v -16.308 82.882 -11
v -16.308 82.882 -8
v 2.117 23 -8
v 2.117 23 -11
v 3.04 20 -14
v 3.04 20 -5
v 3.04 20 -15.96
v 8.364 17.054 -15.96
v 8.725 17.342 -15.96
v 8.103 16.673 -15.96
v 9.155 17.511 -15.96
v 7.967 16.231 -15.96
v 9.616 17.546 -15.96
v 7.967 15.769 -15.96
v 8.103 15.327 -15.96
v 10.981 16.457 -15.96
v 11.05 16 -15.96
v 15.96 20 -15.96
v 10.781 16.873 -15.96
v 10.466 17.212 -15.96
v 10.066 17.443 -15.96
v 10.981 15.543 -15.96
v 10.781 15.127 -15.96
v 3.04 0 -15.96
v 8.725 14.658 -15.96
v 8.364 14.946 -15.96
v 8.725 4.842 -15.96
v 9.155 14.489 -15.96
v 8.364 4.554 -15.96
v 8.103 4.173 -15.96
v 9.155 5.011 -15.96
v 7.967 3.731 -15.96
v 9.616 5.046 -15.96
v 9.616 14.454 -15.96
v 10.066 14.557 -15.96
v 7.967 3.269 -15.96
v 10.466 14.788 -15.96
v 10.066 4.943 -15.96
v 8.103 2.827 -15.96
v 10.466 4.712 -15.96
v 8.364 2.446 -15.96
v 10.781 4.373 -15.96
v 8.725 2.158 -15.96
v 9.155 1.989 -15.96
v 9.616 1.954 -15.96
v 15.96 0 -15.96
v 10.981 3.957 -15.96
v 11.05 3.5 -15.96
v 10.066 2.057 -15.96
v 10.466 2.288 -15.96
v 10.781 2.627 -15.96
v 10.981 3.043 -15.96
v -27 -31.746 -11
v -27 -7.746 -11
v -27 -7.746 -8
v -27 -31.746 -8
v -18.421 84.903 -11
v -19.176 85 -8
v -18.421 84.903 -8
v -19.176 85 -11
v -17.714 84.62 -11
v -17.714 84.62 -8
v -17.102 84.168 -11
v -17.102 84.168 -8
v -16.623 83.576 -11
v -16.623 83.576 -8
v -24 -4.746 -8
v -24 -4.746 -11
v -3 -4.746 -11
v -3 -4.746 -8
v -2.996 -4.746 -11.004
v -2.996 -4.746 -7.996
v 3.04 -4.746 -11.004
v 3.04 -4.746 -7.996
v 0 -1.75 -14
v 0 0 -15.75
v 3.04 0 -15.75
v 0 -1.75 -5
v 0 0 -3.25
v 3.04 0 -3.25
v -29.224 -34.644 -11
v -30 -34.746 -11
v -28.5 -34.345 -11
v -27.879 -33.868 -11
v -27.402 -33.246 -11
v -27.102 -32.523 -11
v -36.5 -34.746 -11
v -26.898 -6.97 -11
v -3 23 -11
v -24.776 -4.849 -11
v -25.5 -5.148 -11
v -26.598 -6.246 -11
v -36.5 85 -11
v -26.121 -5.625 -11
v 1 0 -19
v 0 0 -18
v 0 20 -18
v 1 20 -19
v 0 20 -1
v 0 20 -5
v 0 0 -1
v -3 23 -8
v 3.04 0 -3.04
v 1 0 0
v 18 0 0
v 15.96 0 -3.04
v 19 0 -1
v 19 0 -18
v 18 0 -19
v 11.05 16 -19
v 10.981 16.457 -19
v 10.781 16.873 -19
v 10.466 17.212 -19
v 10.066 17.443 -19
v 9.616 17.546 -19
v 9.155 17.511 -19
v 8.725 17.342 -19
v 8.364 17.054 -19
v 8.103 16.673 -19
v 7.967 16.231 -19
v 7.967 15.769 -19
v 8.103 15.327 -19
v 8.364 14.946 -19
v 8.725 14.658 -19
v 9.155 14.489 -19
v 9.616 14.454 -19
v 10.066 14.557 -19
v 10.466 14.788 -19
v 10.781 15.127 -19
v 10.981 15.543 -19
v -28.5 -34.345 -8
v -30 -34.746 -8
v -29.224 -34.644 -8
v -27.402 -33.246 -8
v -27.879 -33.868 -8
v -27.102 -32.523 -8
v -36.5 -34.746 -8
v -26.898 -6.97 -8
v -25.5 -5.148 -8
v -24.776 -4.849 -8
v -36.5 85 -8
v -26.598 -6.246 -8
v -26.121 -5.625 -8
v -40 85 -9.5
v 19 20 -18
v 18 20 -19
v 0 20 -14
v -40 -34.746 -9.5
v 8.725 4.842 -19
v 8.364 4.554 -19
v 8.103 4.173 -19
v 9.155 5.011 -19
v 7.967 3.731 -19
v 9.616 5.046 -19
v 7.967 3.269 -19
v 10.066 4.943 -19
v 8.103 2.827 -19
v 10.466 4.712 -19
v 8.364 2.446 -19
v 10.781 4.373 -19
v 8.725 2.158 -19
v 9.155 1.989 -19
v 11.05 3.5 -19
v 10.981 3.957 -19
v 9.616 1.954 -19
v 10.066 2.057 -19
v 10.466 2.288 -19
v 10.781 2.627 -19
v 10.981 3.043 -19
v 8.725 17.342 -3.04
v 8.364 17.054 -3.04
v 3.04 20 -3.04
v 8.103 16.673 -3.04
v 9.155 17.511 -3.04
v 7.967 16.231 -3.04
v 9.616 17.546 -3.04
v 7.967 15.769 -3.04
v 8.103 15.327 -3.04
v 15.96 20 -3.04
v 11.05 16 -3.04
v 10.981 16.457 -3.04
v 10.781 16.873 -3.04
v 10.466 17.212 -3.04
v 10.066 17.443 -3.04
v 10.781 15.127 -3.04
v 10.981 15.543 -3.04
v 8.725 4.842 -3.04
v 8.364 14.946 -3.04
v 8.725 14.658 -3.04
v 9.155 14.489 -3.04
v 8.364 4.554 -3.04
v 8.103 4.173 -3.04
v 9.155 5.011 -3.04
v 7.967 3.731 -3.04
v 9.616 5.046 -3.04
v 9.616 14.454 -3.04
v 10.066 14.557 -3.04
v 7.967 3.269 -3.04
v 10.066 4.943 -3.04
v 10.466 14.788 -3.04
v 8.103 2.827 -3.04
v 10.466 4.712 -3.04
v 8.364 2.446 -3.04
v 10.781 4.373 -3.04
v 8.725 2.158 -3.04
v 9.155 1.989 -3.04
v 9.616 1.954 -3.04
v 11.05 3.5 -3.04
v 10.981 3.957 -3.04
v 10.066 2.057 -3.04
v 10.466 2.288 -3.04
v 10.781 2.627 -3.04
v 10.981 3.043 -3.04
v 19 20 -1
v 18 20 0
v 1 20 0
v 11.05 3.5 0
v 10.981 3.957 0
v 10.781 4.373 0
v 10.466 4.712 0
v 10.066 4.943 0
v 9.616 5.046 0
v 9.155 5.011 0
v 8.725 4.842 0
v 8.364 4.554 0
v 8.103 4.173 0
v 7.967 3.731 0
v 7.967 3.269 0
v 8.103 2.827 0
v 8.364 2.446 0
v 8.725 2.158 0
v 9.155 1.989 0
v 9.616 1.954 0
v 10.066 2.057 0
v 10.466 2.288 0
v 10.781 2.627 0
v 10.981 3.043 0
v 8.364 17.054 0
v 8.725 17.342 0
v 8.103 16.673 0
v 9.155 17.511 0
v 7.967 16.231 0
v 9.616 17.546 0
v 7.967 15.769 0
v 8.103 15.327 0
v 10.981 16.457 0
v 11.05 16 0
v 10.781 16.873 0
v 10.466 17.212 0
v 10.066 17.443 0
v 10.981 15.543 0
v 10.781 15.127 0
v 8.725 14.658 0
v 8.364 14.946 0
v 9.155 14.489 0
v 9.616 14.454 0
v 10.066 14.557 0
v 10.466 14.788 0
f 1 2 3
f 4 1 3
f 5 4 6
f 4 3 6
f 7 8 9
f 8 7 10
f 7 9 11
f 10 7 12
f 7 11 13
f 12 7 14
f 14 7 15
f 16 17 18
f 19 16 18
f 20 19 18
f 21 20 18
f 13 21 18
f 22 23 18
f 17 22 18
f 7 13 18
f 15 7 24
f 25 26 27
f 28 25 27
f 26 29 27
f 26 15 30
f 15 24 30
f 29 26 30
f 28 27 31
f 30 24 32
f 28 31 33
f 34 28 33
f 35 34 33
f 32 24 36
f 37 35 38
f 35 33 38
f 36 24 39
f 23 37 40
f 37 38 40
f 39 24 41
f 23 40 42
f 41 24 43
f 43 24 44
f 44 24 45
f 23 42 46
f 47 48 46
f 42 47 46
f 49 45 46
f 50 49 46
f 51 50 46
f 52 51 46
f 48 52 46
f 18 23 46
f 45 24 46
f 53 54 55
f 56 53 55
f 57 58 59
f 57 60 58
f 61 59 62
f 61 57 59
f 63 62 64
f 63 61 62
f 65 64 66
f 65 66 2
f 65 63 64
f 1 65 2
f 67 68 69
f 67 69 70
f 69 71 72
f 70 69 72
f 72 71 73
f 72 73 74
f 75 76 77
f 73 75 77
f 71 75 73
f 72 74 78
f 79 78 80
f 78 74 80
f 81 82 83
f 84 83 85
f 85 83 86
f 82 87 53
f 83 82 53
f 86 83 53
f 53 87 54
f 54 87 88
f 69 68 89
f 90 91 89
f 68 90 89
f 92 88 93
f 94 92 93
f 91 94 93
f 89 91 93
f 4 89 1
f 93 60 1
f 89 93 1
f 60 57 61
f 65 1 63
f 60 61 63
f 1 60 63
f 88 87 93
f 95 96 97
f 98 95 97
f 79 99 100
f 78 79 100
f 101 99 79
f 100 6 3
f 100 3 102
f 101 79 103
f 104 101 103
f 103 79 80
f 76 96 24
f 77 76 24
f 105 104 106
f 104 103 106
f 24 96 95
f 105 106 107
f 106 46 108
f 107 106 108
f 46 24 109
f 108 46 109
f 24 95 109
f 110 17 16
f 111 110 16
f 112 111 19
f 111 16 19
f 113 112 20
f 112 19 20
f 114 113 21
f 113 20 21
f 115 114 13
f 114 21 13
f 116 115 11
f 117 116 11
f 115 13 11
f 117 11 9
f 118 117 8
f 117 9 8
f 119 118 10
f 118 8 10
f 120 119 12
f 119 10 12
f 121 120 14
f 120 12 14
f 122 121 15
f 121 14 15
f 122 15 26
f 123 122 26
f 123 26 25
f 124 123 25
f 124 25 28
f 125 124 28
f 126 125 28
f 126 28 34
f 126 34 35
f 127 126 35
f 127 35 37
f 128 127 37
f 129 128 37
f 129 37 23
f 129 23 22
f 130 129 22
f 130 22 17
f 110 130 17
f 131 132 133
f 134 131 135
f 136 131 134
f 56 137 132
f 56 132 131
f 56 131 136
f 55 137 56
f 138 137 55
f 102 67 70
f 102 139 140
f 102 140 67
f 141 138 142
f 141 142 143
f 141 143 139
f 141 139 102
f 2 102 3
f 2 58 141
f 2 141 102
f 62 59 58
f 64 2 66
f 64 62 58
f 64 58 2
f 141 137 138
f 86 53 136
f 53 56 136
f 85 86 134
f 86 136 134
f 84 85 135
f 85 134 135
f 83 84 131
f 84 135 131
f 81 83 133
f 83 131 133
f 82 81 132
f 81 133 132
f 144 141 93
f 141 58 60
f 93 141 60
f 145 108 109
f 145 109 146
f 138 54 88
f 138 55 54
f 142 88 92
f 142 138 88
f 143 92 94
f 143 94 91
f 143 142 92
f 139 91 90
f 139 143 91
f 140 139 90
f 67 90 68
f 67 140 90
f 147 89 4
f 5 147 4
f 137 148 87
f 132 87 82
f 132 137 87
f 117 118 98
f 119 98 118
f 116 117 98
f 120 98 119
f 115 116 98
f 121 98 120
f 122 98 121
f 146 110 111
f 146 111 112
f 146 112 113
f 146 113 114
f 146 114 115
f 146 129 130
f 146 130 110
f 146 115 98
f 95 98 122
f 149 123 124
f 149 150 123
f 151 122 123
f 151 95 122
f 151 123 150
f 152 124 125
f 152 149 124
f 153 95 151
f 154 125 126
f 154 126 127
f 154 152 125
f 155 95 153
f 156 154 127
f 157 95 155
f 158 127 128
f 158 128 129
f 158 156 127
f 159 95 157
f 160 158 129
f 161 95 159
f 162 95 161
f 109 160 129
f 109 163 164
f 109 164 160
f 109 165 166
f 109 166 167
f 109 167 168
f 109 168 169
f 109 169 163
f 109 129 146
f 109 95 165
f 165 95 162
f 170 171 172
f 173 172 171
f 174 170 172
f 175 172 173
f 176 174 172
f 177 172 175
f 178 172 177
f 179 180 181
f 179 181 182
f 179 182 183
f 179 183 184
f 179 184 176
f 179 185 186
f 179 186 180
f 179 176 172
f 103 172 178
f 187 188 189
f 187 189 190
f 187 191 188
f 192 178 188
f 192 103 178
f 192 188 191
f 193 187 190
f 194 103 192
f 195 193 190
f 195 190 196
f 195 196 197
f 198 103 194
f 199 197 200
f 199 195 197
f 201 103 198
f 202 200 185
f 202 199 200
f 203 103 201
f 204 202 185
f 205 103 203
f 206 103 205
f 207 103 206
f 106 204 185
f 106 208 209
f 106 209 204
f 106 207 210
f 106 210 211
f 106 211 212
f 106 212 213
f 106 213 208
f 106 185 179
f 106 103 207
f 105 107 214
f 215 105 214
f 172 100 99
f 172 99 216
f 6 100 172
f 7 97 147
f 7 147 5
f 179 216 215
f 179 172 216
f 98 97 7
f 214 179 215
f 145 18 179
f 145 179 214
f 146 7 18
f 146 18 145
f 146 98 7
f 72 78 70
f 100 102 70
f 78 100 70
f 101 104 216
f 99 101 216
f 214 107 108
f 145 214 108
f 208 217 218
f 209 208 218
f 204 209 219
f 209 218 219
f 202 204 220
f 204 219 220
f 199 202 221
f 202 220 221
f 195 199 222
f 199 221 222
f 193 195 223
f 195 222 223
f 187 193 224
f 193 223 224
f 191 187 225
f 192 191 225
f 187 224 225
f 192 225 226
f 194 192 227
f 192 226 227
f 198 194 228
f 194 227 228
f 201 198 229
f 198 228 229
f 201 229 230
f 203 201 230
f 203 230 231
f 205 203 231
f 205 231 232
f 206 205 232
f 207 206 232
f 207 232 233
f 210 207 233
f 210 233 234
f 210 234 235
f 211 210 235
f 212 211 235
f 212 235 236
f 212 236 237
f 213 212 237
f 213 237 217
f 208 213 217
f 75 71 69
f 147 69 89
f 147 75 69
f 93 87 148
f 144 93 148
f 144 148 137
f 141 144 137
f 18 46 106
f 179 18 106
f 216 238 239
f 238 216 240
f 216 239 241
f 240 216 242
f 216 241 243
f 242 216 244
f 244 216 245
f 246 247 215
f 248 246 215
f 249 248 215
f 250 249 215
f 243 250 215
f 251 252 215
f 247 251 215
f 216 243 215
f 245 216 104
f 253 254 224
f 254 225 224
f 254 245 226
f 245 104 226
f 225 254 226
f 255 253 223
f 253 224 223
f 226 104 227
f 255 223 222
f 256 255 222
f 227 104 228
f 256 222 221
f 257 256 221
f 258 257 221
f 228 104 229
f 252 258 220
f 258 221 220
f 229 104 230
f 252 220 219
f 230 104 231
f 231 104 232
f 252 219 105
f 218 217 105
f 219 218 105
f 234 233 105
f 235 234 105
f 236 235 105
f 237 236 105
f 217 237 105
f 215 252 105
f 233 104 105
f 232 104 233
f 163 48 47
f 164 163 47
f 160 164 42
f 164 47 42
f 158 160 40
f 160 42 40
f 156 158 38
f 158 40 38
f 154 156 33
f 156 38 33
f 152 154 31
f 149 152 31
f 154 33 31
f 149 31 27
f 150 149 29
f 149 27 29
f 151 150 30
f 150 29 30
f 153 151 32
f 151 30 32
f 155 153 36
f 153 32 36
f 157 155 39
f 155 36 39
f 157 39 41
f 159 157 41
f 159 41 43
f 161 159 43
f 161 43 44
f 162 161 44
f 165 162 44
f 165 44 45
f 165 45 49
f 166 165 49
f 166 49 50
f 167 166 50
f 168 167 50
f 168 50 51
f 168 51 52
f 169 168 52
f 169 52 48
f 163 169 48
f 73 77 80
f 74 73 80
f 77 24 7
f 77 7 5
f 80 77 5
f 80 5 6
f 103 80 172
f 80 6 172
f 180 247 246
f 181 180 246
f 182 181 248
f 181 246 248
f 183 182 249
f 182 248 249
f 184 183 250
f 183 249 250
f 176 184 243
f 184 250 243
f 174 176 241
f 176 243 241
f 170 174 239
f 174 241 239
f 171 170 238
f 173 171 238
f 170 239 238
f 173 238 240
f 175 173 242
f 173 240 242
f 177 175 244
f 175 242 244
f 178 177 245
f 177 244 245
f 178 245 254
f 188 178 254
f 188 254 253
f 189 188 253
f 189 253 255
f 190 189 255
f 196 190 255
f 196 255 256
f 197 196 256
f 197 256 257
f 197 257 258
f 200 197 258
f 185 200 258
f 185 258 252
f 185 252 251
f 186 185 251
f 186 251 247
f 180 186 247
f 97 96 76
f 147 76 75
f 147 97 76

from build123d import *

# Parameters (mm, degrees)
SKETCH1_W                = 19
SKETCH1_H                = 19
SKETCH1_W_2              = 12.12
SKETCH1_H_2              = 12.12
BOSS_EXTRUDE1_DEPTH      = 20
SKETCH2_R                = 1.55
CUT_EXTRUDE1_DEPTH       = 22
SKETCH3_W                = 12.92
SKETCH3_H                = 12.92
CUT_EXTRUDE2_DEPTH       = 20
BOSS_EXTRUDE2_DEPTH      = 40
BOSS_EXTRUDE2_DEPTH_BACK = 3.04
CUT_EXTRUDE3_DEPTH       = 40
SKETCH7_W                = 13
SKETCH7_H                = 3
BOSS_EXTRUDE3_DEPTH      = 30
CUT_EXTRUDE4_DEPTH       = 129
FILLET2_R                = 3
FILLET3_R                = 3
FILLET4_R                = 3
FILLET5_SIZE             = 4.75
FILLET6_SIZE             = 3
FILLET7_SIZE             = 3
FILLET8_SIZE             = 1


with BuildPart() as part:
    # Sketch1 → Boss-Extrude1 (new body)
    with BuildSketch(Plane(origin=(0, 0, 0), x_dir=(1, 0, 0), z_dir=(0, 1, 0))):
        with Locations((9.5, 9.5)):
            Rectangle(SKETCH1_W, SKETCH1_H)
        with Locations((9.5, 9.5)):
            Rectangle(SKETCH1_W_2, SKETCH1_H_2, mode=Mode.SUBTRACT)
    extrude(amount=BOSS_EXTRUDE1_DEPTH)

    # Sketch2 → Cut-Extrude1 (cut)
    with BuildSketch(Plane.XY):
        with Locations((9.5, 16)):
            Circle(SKETCH2_R)
        with Locations((9.5, 3.5)):
            Circle(SKETCH2_R)
    extrude(amount=-CUT_EXTRUDE1_DEPTH, mode=Mode.SUBTRACT)

    # Sketch3 → Cut-Extrude2 (cut)
    with BuildSketch(Plane.XZ):
        with Locations((9.5, -9.5)):
            Rectangle(SKETCH3_W, SKETCH3_H)
    extrude(amount=-CUT_EXTRUDE2_DEPTH, mode=Mode.SUBTRACT)

    # Sketch4 → Boss-Extrude2 (add, two sides: drawn at the far end of the back side and taken through both)
    with BuildSketch(Plane.ZY.offset(-BOSS_EXTRUDE2_DEPTH_BACK)):
        Polygon((-11, 70), (-11, -4.746484506), (-8, -4.746484506), (-8, 70), (-8, 85), (-11, 85), align=None)
    extrude(amount=BOSS_EXTRUDE2_DEPTH + BOSS_EXTRUDE2_DEPTH_BACK)

    # Sketch5 → Cut-Extrude3 (cut)
    with BuildSketch(Plane.XY.offset(-8)):
        Polygon((-16.96, 85), (3.04, 20), (3.04, 85), align=None)
    extrude(amount=-CUT_EXTRUDE3_DEPTH, mode=Mode.SUBTRACT)

    # Sketch7 → Boss-Extrude3 (add)
    with BuildSketch(Plane.XZ.offset(4.746484506)):
        with Locations((-33.5, -9.5)):
            Rectangle(SKETCH7_W, SKETCH7_H)
    extrude(amount=BOSS_EXTRUDE3_DEPTH)

    # Sketch8 → Cut-Extrude4 (cut)
    with BuildSketch(Plane.XZ.offset(34.746484506)):
        Polygon((-40, -8), (-40, -9.5), (-36.5, -8), align=None)
        Polygon((-36.5, -11), (-40, -9.5), (-40, -11), align=None)
    extrude(amount=-CUT_EXTRUDE4_DEPTH, mode=Mode.SUBTRACT)

    # Fillet2
    fillet2_edges = [part.edges().sort_by_distance(p)[0] for p in [
        (-27, -4.746484506, -9.5),
    ]]
    fillet(fillet2_edges, radius=FILLET2_R)

    # Fillet3
    fillet3_edges = [part.edges().sort_by_distance(p)[0] for p in [
        (-27, -34.746484506, -9.5),
    ]]
    fillet(fillet3_edges, radius=FILLET3_R)

    # Fillet4
    fillet4_edges = [part.edges().sort_by_distance(p)[0] for p in [
        (-16.96, 85, -9.5),
    ]]
    fillet(fillet4_edges, radius=FILLET4_R)

    # Fillet5
    # the kernel refuses this chamfer: 4.75 mm, written as the material it adds along each edge
    with BuildSketch(Plane(origin=(3.04, 0, -8), x_dir=(0, -0.9996219169112968, -0.027495876610586535), z_dir=(-1, 0, 0))) as fillet5_piece_1_section:
        Polygon((FILLET5_SIZE * 0.999621916911, FILLET5_SIZE * 0.0274958766106), (-FILLET5_SIZE * 0.0274958766106, FILLET5_SIZE * 0.999621916911), (0, 0), align=None)
    fillet5_piece_1 = extrude(amount=3.04, mode=Mode.PRIVATE)
    fillet5_piece_1 = split(fillet5_piece_1, bisect_by=Plane(origin=(1.52, -4.746484506, -6.430475531), z_dir=(0, 1, 0)), keep=Keep.TOP, mode=Mode.PRIVATE)
    add(fillet5_piece_1)
    with BuildSketch(Plane(origin=(0, 0, -11), x_dir=(0, 0.02749587661058637, -0.9996219169112968), z_dir=(1, 0, 0))) as fillet5_piece_2_section:
        Polygon((FILLET5_SIZE * 0.999621916911, -FILLET5_SIZE * 0.0274958766106), (-FILLET5_SIZE * 0.0274958766106, -FILLET5_SIZE * 0.999621916911), (0, 0), align=None)
    fillet5_piece_2 = extrude(amount=3.04, mode=Mode.PRIVATE)
    fillet5_piece_2 = split(fillet5_piece_2, bisect_by=Plane(origin=(1.52, -4.746484506, -12.569524469), z_dir=(0, 1, 0)), keep=Keep.TOP, mode=Mode.PRIVATE)
    add(fillet5_piece_2)

    # Fillet6
    fillet6_edges = [part.edges().sort_by_distance(p)[0] for p in [
        (1.52, 20, -11),
        (1.52, 20, -8),
    ]]
    chamfer(fillet6_edges, length=FILLET6_SIZE)

    # Fillet7
    fillet7_edges = [part.edges().sort_by_distance(p)[0] for p in [
        (0, 9.126757747, -11),
        (0, 9.126757747, -8),
    ]]
    chamfer(fillet7_edges, length=FILLET7_SIZE)

    # Fillet8
    fillet8_edges = [part.edges().sort_by_distance(p)[0] for p in [
        (0, 10, -19),
        (19, 10, -19),
        (19, 10, 0),
        (0, 10, 0),
    ]]
    chamfer(fillet8_edges, length=FILLET8_SIZE)


solid = part.part
